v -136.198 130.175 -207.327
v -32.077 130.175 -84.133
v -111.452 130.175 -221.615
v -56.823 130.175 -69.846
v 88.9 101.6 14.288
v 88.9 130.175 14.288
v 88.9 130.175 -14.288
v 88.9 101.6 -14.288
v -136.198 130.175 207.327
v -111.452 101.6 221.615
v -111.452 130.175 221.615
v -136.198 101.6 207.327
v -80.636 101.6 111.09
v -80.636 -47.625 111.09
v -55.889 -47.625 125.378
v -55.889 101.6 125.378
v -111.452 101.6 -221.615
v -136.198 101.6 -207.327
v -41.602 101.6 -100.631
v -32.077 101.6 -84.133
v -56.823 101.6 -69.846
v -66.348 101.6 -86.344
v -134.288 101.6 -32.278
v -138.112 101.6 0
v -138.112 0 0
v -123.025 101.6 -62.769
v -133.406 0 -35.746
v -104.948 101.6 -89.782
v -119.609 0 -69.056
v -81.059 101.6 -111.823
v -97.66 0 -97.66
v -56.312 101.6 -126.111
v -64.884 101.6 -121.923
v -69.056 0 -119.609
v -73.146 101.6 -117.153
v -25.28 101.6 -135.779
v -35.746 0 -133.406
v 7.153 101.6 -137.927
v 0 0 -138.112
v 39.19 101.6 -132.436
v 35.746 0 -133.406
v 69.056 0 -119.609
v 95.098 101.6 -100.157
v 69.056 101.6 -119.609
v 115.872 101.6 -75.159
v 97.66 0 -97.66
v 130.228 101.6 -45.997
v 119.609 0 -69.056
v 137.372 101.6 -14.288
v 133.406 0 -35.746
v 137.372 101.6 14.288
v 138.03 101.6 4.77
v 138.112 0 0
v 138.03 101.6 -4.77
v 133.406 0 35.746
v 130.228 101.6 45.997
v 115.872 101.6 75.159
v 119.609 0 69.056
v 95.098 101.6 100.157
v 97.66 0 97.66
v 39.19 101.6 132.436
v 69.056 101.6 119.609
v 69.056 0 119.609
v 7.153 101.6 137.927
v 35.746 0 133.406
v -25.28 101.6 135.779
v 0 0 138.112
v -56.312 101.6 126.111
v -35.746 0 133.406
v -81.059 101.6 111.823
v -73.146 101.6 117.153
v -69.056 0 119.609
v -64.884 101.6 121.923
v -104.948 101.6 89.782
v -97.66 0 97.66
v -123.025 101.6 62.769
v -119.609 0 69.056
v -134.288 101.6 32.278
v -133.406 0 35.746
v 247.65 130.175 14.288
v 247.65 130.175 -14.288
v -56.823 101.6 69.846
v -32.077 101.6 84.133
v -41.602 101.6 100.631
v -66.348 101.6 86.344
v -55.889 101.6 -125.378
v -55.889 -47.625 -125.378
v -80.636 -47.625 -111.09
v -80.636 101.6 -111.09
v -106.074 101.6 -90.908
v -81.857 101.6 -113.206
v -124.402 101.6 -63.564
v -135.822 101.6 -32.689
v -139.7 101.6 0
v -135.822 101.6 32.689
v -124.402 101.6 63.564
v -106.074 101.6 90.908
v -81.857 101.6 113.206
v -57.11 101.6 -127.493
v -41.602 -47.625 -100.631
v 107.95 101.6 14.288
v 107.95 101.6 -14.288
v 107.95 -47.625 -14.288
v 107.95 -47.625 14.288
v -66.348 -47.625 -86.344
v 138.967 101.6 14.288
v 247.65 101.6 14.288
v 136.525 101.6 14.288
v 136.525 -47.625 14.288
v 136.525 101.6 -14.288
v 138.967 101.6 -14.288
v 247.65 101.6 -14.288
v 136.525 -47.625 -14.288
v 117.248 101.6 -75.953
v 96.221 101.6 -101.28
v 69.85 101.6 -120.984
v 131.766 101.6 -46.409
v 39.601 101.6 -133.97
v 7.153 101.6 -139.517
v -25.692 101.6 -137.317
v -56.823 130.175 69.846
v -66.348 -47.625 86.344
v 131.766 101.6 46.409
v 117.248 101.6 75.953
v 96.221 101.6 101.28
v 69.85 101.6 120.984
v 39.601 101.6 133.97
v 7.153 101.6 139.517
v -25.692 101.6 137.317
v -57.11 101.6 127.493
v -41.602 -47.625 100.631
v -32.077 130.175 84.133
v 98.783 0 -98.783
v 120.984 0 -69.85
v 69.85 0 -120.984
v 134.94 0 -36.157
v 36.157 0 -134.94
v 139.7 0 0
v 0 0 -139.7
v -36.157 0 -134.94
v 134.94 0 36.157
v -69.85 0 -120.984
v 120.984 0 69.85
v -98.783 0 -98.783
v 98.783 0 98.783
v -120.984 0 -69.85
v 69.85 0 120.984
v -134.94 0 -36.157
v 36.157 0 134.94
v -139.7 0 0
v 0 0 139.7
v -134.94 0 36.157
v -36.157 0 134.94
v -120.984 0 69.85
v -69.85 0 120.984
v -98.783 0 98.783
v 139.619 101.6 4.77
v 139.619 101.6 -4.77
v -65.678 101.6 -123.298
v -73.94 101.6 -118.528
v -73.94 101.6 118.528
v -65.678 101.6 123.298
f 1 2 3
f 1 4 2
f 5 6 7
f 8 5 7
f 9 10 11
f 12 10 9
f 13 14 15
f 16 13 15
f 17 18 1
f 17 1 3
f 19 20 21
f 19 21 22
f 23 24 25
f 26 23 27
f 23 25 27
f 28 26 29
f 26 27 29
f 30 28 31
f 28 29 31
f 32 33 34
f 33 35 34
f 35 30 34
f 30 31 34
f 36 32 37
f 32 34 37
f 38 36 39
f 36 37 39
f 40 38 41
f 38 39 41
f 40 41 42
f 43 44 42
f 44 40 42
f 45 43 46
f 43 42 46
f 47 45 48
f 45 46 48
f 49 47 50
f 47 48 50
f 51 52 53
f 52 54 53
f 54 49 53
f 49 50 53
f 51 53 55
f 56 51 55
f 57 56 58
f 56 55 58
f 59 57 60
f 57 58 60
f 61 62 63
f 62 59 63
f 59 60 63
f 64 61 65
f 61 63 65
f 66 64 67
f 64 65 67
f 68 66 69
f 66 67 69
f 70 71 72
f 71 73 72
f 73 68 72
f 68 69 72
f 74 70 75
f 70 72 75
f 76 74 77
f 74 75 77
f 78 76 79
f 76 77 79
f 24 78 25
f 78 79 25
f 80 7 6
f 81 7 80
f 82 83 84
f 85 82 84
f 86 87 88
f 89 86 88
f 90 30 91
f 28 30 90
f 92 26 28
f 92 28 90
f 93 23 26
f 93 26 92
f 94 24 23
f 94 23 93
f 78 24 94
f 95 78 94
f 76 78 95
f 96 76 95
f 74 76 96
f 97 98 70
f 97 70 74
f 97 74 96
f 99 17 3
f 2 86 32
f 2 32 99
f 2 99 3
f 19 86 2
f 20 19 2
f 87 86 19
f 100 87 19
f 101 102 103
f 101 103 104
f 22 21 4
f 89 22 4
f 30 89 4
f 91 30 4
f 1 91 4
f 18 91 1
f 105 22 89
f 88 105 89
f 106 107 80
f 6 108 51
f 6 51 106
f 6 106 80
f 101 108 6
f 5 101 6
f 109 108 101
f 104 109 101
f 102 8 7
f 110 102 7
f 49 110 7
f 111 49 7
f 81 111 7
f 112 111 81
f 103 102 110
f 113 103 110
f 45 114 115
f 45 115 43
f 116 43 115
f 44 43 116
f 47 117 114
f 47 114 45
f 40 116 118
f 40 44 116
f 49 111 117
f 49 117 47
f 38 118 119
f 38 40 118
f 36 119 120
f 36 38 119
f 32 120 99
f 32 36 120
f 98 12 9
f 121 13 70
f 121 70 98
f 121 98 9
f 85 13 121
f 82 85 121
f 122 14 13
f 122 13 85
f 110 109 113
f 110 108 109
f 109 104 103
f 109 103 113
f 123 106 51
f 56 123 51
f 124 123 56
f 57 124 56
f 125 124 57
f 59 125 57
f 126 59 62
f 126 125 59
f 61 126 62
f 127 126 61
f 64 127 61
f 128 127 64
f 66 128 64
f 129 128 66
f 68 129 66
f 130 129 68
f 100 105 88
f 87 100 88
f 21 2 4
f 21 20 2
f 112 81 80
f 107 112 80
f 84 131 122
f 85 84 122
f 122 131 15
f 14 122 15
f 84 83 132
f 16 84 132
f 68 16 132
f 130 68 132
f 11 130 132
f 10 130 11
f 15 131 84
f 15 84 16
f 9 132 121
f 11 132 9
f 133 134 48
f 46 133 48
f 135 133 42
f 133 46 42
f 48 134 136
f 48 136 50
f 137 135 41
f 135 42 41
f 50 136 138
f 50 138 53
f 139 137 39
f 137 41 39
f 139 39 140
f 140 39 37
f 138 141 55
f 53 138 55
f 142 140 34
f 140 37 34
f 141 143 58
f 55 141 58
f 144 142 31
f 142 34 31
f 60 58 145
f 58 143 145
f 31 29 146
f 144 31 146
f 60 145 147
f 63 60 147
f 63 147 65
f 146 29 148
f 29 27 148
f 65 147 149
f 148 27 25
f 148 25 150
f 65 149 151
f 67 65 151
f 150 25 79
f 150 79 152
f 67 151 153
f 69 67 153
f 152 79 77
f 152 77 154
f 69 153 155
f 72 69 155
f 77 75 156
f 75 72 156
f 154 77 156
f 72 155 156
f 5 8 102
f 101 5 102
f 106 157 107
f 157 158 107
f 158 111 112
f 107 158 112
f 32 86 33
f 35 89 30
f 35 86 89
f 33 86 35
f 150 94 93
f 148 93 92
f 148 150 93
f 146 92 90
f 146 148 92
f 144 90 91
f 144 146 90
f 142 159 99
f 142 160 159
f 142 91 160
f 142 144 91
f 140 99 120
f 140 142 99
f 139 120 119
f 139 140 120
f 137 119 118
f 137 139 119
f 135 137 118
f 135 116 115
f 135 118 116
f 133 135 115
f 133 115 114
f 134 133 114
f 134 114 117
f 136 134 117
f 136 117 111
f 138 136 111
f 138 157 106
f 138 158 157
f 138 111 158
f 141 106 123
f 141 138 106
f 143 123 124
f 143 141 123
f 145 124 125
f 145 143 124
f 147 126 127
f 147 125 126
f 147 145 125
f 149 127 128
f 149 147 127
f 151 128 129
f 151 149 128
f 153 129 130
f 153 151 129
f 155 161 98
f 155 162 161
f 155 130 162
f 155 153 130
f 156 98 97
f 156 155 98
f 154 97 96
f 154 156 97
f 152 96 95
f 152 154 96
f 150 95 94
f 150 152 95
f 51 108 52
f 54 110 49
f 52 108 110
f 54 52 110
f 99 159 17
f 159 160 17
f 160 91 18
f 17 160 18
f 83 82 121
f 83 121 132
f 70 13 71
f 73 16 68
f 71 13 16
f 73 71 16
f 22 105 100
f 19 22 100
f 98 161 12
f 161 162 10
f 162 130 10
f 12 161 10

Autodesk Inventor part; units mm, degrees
ref_plane "YZ Plane" through (0, 0, 0) normal (1, 0, 0) x (0, 1, 0)
ref_plane "XZ Plane" through (0, 0, 0) normal (0, 1, 0) x (-1, 0, 0)
ref_plane "XY Plane" through (0, 0, 0) normal (0, 0, 1) x (1, 0, 0)
sketch "Sketch1" plane through (0, 0, 0) normal (0, 1, 0) x (-1, 0, 0)
  circle A0 centre (0, 0) radius 139.7
  circle A1 centre (0, 0) radius 138.1125
  dimension "d0" = 279.4
  dimension "d1" = 276.225
extrude "Extrusion1" add sketch "Sketch1" along normal blind 101.6
sketch "Sketch2" plane through (0, 101.6, 0) normal (0, 1, 0) x (1, 0, 0)
  line L0 (88.9, 14.2875) -> (247.65, 14.2875)
  line L1 (247.65, 14.2875) -> (247.65, -14.2875)
  line L2 (247.65, -14.2875) -> (88.9, -14.2875)
  line L3 (88.9, -14.2875) -> (88.9, 14.2875)
  line L4 (88.9, 14.2875) -> (247.65, -14.2875) construction
  line L5 (247.65, 14.2875) -> (88.9, -14.2875) construction
  circle A0 centre (0, 0) radius 139.7 projected
  point P0 (168.275, 0)
  point P1 (168.275, 0)
  point P2 (139.7, 0)
  dimension "d4" = 158.75
  dimension "d5" = 28.575
  dimension "d7" = 107.95
extrude "Extrusion2" add sketch "Sketch2" along normal blind 28.575 contours L0 A0 L2 L3 | L0 L1 L2 A0 picked at (105.8333, 0)
sketch "Sketch3" plane through (0, 101.6, 0) normal (0, -1, 0) x (1, 0, 0)
  line L0 (247.65, -14.2875) -> (88.9, -14.2875) projected
  line L1 (107.95, 14.2875) -> (136.525, 14.2875)
  line L2 (136.525, 14.2875) -> (136.525, -14.2875)
  line L3 (136.525, -14.2875) -> (107.95, -14.2875)
  line L4 (107.95, -14.2875) -> (107.95, 14.2875)
  line L5 (107.95, 14.2875) -> (136.525, -14.2875) construction
  line L6 (136.525, 14.2875) -> (107.95, -14.2875) construction
  line L7 (88.9, 14.2875) -> (88.9, -14.2875) projected
  line L8 (137.3715, 14.2875) -> (88.9, 14.2875) projected
  point P0 (0, 0)
  point P1 (122.2375, 0)
  dimension "d10" = 28.575
  dimension "d11" = 19.05
extrude "Extrusion3" add sketch "Sketch3" along normal blind 149.225 contours L0 L4 L1 L2
pattern_circular "Circular Pattern1" count 3 over 360 about axis through (0, 0, 0) along (0, 1, 0) of "Extrusion2", "Extrusion3"
properties part number "Burner-Placeholder"
